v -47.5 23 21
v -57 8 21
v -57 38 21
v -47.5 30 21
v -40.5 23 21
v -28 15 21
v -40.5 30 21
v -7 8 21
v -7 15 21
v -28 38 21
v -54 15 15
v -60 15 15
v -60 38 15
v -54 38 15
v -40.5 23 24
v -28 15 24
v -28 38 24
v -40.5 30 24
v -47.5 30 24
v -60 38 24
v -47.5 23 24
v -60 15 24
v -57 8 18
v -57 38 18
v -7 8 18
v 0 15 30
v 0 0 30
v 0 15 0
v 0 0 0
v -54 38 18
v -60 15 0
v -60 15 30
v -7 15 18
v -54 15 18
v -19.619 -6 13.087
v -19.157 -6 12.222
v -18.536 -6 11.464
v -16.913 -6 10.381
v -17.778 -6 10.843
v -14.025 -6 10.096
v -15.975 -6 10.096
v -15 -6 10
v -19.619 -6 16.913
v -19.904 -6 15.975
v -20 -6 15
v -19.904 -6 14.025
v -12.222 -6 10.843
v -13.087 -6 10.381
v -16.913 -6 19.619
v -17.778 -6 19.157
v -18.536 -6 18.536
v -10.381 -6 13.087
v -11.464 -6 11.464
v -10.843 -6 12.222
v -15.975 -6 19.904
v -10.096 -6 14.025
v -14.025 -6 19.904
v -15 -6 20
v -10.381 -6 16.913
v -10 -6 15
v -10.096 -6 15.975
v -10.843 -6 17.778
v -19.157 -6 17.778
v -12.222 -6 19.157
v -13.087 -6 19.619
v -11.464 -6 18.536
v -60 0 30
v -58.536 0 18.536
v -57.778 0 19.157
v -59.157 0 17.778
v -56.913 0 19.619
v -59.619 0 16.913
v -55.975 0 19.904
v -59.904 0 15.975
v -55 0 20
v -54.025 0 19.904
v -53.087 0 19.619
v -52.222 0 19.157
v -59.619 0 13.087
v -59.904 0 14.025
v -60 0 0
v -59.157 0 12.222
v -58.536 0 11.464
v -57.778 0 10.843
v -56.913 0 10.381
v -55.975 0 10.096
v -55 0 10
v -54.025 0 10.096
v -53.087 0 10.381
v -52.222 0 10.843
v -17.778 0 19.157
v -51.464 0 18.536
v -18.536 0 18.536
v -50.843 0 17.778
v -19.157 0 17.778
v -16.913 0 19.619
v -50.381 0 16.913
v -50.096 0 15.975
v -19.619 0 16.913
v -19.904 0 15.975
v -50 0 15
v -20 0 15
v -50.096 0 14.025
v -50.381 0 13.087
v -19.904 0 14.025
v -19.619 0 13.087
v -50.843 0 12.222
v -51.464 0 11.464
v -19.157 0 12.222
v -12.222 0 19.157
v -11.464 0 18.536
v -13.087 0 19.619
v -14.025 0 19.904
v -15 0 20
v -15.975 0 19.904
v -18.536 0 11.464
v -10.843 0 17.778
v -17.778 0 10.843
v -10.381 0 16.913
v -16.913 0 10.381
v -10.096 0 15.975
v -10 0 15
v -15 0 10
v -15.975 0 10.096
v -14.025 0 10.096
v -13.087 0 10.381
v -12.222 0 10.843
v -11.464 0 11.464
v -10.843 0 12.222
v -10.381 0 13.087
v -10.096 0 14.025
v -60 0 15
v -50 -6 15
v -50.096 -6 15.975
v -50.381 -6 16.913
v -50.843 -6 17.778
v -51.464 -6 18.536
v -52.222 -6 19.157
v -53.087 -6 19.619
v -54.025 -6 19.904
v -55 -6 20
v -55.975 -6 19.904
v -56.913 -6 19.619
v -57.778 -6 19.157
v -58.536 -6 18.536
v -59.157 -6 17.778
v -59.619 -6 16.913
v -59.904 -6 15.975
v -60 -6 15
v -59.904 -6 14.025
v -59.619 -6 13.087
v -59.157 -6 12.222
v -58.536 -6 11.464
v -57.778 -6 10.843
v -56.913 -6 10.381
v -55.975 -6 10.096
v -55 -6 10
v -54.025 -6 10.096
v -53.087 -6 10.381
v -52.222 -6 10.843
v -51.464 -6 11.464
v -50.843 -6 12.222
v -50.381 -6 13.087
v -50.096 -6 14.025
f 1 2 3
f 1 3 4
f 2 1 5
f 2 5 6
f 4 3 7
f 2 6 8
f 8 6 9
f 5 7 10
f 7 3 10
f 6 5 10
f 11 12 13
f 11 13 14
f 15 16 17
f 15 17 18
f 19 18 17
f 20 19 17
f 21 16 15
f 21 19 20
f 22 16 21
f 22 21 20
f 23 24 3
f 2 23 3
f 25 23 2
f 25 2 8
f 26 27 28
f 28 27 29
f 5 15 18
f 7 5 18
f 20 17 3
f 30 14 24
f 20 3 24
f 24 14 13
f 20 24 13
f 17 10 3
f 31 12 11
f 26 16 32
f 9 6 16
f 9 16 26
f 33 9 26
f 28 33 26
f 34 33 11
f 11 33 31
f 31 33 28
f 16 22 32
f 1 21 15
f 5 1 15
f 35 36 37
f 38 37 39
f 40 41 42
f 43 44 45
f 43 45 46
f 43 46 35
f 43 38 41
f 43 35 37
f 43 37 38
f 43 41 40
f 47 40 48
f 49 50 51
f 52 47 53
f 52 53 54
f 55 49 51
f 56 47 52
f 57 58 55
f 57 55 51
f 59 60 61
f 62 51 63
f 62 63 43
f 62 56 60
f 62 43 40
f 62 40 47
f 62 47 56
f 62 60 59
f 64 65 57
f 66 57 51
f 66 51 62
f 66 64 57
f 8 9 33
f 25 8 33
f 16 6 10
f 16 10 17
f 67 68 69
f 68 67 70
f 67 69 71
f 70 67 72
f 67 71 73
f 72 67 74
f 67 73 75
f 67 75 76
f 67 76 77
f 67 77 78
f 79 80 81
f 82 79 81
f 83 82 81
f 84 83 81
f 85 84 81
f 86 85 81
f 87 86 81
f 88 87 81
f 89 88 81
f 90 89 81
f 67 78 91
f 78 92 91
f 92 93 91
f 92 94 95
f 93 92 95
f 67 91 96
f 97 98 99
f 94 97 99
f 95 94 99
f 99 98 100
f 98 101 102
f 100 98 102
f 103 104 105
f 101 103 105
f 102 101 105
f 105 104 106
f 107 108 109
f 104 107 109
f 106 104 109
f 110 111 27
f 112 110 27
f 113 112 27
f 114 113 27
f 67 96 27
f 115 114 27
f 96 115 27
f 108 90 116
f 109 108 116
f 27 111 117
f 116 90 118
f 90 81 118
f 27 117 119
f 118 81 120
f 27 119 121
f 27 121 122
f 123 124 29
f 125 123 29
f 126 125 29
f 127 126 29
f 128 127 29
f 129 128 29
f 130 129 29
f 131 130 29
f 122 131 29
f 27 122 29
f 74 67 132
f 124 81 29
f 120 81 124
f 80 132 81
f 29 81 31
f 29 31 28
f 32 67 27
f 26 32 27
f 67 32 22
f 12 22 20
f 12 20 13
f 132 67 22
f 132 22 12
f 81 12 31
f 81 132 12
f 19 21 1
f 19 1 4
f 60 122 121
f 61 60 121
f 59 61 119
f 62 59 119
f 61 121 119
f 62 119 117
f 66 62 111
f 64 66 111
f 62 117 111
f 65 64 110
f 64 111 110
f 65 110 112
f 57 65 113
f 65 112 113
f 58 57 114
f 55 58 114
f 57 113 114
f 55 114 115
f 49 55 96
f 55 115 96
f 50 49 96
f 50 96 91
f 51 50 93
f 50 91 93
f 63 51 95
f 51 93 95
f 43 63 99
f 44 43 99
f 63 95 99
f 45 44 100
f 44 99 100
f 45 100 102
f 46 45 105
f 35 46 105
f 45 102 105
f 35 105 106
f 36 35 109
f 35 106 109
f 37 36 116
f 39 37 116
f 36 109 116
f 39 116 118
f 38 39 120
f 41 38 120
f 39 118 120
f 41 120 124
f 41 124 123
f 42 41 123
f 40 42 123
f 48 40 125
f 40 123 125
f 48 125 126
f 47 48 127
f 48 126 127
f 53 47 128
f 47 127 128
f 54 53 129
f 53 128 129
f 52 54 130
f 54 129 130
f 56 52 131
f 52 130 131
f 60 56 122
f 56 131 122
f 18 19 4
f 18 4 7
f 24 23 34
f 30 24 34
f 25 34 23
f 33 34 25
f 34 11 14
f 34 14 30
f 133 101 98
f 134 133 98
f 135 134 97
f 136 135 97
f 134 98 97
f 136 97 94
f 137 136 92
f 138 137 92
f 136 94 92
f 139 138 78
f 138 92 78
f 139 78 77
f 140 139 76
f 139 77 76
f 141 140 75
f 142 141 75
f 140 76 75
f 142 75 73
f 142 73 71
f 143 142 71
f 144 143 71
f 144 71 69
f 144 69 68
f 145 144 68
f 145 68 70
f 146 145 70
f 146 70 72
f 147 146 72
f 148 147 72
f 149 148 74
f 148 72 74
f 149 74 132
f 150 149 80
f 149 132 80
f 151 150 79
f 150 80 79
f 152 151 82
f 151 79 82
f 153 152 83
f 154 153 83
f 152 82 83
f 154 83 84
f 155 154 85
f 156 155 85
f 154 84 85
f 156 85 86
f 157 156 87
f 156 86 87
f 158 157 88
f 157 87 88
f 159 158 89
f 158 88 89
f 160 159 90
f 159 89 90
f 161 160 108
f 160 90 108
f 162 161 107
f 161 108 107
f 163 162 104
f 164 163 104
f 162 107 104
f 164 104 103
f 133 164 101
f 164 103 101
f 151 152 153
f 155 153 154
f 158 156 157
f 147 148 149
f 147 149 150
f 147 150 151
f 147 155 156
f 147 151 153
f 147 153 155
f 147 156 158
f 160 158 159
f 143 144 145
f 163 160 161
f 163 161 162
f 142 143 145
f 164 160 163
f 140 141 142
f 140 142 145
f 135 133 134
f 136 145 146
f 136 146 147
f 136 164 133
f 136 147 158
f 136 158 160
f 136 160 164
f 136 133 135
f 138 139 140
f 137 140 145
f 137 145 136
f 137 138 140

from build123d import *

# Parameters (mm, degrees)
ESQUISSE5_W             = 60
ESQUISSE5_H             = 30
BOSS_EXTRU_2_DEPTH      = 15
ESQUISSE6_R             = 5
BOSS_EXTRU_3_DEPTH      = 6
BOSS_EXTRU_4_DEPTH      = 23
ESQUISSE8_W             = 50
ESQUISSE8_H             = 3
ENL_V_MAT_EXTRU_1_DEPTH = 7
ESQUISSE9_W             = 7
ESQUISSE9_H             = 7
ENL_V_MAT_EXTRU_2_DEPTH = 7


with BuildPart() as part:
    # Esquisse5 → Boss.-Extru.2 (new body)
    with BuildSketch(Plane(origin=(0, 0, 0), x_dir=(1, 0, 0), z_dir=(0, 1, 0))):
        with Locations((-30, -15)):
            Rectangle(ESQUISSE5_W, ESQUISSE5_H)
    extrude(amount=BOSS_EXTRU_2_DEPTH)

    # Esquisse6 → Boss.-Extru.3 (add)
    with BuildSketch(Plane.XZ):
        with Locations((-55, 15)):
            Circle(ESQUISSE6_R)
        with Locations((-15, 15)):
            Circle(ESQUISSE6_R)
    extrude(amount=BOSS_EXTRU_3_DEPTH)

    # Esquisse7 → Boss.-Extru.4 (add)
    with BuildSketch(Plane(origin=(0, 15, 0), x_dir=(1, 0, 0), z_dir=(0, 1, 0))):
        Polygon((-60, -15), (-54, -15), (-54, -18), (-57, -18), (-57, -21), (-28, -21), (-28, -24), (-60, -24), align=None)
    extrude(amount=BOSS_EXTRU_4_DEPTH)

    # Esquisse8 → Enlèv. mat.-Extru.1 (cut)
    with BuildSketch(Plane(origin=(0, 15, 0), x_dir=(1, 0, 0), z_dir=(0, 1, 0))):
        with Locations((-32, -19.5)):
            Rectangle(ESQUISSE8_W, ESQUISSE8_H)
    extrude(amount=-ENL_V_MAT_EXTRU_1_DEPTH, mode=Mode.SUBTRACT)

    # Esquisse9 → Enlèv. mat.-Extru.2 (cut)
    with BuildSketch(Plane.XY.offset(24)):
        with Locations((-44, 26.5)):
            Rectangle(ESQUISSE9_W, ESQUISSE9_H)
    extrude(amount=-ENL_V_MAT_EXTRU_2_DEPTH, mode=Mode.SUBTRACT)


solid = part.part
